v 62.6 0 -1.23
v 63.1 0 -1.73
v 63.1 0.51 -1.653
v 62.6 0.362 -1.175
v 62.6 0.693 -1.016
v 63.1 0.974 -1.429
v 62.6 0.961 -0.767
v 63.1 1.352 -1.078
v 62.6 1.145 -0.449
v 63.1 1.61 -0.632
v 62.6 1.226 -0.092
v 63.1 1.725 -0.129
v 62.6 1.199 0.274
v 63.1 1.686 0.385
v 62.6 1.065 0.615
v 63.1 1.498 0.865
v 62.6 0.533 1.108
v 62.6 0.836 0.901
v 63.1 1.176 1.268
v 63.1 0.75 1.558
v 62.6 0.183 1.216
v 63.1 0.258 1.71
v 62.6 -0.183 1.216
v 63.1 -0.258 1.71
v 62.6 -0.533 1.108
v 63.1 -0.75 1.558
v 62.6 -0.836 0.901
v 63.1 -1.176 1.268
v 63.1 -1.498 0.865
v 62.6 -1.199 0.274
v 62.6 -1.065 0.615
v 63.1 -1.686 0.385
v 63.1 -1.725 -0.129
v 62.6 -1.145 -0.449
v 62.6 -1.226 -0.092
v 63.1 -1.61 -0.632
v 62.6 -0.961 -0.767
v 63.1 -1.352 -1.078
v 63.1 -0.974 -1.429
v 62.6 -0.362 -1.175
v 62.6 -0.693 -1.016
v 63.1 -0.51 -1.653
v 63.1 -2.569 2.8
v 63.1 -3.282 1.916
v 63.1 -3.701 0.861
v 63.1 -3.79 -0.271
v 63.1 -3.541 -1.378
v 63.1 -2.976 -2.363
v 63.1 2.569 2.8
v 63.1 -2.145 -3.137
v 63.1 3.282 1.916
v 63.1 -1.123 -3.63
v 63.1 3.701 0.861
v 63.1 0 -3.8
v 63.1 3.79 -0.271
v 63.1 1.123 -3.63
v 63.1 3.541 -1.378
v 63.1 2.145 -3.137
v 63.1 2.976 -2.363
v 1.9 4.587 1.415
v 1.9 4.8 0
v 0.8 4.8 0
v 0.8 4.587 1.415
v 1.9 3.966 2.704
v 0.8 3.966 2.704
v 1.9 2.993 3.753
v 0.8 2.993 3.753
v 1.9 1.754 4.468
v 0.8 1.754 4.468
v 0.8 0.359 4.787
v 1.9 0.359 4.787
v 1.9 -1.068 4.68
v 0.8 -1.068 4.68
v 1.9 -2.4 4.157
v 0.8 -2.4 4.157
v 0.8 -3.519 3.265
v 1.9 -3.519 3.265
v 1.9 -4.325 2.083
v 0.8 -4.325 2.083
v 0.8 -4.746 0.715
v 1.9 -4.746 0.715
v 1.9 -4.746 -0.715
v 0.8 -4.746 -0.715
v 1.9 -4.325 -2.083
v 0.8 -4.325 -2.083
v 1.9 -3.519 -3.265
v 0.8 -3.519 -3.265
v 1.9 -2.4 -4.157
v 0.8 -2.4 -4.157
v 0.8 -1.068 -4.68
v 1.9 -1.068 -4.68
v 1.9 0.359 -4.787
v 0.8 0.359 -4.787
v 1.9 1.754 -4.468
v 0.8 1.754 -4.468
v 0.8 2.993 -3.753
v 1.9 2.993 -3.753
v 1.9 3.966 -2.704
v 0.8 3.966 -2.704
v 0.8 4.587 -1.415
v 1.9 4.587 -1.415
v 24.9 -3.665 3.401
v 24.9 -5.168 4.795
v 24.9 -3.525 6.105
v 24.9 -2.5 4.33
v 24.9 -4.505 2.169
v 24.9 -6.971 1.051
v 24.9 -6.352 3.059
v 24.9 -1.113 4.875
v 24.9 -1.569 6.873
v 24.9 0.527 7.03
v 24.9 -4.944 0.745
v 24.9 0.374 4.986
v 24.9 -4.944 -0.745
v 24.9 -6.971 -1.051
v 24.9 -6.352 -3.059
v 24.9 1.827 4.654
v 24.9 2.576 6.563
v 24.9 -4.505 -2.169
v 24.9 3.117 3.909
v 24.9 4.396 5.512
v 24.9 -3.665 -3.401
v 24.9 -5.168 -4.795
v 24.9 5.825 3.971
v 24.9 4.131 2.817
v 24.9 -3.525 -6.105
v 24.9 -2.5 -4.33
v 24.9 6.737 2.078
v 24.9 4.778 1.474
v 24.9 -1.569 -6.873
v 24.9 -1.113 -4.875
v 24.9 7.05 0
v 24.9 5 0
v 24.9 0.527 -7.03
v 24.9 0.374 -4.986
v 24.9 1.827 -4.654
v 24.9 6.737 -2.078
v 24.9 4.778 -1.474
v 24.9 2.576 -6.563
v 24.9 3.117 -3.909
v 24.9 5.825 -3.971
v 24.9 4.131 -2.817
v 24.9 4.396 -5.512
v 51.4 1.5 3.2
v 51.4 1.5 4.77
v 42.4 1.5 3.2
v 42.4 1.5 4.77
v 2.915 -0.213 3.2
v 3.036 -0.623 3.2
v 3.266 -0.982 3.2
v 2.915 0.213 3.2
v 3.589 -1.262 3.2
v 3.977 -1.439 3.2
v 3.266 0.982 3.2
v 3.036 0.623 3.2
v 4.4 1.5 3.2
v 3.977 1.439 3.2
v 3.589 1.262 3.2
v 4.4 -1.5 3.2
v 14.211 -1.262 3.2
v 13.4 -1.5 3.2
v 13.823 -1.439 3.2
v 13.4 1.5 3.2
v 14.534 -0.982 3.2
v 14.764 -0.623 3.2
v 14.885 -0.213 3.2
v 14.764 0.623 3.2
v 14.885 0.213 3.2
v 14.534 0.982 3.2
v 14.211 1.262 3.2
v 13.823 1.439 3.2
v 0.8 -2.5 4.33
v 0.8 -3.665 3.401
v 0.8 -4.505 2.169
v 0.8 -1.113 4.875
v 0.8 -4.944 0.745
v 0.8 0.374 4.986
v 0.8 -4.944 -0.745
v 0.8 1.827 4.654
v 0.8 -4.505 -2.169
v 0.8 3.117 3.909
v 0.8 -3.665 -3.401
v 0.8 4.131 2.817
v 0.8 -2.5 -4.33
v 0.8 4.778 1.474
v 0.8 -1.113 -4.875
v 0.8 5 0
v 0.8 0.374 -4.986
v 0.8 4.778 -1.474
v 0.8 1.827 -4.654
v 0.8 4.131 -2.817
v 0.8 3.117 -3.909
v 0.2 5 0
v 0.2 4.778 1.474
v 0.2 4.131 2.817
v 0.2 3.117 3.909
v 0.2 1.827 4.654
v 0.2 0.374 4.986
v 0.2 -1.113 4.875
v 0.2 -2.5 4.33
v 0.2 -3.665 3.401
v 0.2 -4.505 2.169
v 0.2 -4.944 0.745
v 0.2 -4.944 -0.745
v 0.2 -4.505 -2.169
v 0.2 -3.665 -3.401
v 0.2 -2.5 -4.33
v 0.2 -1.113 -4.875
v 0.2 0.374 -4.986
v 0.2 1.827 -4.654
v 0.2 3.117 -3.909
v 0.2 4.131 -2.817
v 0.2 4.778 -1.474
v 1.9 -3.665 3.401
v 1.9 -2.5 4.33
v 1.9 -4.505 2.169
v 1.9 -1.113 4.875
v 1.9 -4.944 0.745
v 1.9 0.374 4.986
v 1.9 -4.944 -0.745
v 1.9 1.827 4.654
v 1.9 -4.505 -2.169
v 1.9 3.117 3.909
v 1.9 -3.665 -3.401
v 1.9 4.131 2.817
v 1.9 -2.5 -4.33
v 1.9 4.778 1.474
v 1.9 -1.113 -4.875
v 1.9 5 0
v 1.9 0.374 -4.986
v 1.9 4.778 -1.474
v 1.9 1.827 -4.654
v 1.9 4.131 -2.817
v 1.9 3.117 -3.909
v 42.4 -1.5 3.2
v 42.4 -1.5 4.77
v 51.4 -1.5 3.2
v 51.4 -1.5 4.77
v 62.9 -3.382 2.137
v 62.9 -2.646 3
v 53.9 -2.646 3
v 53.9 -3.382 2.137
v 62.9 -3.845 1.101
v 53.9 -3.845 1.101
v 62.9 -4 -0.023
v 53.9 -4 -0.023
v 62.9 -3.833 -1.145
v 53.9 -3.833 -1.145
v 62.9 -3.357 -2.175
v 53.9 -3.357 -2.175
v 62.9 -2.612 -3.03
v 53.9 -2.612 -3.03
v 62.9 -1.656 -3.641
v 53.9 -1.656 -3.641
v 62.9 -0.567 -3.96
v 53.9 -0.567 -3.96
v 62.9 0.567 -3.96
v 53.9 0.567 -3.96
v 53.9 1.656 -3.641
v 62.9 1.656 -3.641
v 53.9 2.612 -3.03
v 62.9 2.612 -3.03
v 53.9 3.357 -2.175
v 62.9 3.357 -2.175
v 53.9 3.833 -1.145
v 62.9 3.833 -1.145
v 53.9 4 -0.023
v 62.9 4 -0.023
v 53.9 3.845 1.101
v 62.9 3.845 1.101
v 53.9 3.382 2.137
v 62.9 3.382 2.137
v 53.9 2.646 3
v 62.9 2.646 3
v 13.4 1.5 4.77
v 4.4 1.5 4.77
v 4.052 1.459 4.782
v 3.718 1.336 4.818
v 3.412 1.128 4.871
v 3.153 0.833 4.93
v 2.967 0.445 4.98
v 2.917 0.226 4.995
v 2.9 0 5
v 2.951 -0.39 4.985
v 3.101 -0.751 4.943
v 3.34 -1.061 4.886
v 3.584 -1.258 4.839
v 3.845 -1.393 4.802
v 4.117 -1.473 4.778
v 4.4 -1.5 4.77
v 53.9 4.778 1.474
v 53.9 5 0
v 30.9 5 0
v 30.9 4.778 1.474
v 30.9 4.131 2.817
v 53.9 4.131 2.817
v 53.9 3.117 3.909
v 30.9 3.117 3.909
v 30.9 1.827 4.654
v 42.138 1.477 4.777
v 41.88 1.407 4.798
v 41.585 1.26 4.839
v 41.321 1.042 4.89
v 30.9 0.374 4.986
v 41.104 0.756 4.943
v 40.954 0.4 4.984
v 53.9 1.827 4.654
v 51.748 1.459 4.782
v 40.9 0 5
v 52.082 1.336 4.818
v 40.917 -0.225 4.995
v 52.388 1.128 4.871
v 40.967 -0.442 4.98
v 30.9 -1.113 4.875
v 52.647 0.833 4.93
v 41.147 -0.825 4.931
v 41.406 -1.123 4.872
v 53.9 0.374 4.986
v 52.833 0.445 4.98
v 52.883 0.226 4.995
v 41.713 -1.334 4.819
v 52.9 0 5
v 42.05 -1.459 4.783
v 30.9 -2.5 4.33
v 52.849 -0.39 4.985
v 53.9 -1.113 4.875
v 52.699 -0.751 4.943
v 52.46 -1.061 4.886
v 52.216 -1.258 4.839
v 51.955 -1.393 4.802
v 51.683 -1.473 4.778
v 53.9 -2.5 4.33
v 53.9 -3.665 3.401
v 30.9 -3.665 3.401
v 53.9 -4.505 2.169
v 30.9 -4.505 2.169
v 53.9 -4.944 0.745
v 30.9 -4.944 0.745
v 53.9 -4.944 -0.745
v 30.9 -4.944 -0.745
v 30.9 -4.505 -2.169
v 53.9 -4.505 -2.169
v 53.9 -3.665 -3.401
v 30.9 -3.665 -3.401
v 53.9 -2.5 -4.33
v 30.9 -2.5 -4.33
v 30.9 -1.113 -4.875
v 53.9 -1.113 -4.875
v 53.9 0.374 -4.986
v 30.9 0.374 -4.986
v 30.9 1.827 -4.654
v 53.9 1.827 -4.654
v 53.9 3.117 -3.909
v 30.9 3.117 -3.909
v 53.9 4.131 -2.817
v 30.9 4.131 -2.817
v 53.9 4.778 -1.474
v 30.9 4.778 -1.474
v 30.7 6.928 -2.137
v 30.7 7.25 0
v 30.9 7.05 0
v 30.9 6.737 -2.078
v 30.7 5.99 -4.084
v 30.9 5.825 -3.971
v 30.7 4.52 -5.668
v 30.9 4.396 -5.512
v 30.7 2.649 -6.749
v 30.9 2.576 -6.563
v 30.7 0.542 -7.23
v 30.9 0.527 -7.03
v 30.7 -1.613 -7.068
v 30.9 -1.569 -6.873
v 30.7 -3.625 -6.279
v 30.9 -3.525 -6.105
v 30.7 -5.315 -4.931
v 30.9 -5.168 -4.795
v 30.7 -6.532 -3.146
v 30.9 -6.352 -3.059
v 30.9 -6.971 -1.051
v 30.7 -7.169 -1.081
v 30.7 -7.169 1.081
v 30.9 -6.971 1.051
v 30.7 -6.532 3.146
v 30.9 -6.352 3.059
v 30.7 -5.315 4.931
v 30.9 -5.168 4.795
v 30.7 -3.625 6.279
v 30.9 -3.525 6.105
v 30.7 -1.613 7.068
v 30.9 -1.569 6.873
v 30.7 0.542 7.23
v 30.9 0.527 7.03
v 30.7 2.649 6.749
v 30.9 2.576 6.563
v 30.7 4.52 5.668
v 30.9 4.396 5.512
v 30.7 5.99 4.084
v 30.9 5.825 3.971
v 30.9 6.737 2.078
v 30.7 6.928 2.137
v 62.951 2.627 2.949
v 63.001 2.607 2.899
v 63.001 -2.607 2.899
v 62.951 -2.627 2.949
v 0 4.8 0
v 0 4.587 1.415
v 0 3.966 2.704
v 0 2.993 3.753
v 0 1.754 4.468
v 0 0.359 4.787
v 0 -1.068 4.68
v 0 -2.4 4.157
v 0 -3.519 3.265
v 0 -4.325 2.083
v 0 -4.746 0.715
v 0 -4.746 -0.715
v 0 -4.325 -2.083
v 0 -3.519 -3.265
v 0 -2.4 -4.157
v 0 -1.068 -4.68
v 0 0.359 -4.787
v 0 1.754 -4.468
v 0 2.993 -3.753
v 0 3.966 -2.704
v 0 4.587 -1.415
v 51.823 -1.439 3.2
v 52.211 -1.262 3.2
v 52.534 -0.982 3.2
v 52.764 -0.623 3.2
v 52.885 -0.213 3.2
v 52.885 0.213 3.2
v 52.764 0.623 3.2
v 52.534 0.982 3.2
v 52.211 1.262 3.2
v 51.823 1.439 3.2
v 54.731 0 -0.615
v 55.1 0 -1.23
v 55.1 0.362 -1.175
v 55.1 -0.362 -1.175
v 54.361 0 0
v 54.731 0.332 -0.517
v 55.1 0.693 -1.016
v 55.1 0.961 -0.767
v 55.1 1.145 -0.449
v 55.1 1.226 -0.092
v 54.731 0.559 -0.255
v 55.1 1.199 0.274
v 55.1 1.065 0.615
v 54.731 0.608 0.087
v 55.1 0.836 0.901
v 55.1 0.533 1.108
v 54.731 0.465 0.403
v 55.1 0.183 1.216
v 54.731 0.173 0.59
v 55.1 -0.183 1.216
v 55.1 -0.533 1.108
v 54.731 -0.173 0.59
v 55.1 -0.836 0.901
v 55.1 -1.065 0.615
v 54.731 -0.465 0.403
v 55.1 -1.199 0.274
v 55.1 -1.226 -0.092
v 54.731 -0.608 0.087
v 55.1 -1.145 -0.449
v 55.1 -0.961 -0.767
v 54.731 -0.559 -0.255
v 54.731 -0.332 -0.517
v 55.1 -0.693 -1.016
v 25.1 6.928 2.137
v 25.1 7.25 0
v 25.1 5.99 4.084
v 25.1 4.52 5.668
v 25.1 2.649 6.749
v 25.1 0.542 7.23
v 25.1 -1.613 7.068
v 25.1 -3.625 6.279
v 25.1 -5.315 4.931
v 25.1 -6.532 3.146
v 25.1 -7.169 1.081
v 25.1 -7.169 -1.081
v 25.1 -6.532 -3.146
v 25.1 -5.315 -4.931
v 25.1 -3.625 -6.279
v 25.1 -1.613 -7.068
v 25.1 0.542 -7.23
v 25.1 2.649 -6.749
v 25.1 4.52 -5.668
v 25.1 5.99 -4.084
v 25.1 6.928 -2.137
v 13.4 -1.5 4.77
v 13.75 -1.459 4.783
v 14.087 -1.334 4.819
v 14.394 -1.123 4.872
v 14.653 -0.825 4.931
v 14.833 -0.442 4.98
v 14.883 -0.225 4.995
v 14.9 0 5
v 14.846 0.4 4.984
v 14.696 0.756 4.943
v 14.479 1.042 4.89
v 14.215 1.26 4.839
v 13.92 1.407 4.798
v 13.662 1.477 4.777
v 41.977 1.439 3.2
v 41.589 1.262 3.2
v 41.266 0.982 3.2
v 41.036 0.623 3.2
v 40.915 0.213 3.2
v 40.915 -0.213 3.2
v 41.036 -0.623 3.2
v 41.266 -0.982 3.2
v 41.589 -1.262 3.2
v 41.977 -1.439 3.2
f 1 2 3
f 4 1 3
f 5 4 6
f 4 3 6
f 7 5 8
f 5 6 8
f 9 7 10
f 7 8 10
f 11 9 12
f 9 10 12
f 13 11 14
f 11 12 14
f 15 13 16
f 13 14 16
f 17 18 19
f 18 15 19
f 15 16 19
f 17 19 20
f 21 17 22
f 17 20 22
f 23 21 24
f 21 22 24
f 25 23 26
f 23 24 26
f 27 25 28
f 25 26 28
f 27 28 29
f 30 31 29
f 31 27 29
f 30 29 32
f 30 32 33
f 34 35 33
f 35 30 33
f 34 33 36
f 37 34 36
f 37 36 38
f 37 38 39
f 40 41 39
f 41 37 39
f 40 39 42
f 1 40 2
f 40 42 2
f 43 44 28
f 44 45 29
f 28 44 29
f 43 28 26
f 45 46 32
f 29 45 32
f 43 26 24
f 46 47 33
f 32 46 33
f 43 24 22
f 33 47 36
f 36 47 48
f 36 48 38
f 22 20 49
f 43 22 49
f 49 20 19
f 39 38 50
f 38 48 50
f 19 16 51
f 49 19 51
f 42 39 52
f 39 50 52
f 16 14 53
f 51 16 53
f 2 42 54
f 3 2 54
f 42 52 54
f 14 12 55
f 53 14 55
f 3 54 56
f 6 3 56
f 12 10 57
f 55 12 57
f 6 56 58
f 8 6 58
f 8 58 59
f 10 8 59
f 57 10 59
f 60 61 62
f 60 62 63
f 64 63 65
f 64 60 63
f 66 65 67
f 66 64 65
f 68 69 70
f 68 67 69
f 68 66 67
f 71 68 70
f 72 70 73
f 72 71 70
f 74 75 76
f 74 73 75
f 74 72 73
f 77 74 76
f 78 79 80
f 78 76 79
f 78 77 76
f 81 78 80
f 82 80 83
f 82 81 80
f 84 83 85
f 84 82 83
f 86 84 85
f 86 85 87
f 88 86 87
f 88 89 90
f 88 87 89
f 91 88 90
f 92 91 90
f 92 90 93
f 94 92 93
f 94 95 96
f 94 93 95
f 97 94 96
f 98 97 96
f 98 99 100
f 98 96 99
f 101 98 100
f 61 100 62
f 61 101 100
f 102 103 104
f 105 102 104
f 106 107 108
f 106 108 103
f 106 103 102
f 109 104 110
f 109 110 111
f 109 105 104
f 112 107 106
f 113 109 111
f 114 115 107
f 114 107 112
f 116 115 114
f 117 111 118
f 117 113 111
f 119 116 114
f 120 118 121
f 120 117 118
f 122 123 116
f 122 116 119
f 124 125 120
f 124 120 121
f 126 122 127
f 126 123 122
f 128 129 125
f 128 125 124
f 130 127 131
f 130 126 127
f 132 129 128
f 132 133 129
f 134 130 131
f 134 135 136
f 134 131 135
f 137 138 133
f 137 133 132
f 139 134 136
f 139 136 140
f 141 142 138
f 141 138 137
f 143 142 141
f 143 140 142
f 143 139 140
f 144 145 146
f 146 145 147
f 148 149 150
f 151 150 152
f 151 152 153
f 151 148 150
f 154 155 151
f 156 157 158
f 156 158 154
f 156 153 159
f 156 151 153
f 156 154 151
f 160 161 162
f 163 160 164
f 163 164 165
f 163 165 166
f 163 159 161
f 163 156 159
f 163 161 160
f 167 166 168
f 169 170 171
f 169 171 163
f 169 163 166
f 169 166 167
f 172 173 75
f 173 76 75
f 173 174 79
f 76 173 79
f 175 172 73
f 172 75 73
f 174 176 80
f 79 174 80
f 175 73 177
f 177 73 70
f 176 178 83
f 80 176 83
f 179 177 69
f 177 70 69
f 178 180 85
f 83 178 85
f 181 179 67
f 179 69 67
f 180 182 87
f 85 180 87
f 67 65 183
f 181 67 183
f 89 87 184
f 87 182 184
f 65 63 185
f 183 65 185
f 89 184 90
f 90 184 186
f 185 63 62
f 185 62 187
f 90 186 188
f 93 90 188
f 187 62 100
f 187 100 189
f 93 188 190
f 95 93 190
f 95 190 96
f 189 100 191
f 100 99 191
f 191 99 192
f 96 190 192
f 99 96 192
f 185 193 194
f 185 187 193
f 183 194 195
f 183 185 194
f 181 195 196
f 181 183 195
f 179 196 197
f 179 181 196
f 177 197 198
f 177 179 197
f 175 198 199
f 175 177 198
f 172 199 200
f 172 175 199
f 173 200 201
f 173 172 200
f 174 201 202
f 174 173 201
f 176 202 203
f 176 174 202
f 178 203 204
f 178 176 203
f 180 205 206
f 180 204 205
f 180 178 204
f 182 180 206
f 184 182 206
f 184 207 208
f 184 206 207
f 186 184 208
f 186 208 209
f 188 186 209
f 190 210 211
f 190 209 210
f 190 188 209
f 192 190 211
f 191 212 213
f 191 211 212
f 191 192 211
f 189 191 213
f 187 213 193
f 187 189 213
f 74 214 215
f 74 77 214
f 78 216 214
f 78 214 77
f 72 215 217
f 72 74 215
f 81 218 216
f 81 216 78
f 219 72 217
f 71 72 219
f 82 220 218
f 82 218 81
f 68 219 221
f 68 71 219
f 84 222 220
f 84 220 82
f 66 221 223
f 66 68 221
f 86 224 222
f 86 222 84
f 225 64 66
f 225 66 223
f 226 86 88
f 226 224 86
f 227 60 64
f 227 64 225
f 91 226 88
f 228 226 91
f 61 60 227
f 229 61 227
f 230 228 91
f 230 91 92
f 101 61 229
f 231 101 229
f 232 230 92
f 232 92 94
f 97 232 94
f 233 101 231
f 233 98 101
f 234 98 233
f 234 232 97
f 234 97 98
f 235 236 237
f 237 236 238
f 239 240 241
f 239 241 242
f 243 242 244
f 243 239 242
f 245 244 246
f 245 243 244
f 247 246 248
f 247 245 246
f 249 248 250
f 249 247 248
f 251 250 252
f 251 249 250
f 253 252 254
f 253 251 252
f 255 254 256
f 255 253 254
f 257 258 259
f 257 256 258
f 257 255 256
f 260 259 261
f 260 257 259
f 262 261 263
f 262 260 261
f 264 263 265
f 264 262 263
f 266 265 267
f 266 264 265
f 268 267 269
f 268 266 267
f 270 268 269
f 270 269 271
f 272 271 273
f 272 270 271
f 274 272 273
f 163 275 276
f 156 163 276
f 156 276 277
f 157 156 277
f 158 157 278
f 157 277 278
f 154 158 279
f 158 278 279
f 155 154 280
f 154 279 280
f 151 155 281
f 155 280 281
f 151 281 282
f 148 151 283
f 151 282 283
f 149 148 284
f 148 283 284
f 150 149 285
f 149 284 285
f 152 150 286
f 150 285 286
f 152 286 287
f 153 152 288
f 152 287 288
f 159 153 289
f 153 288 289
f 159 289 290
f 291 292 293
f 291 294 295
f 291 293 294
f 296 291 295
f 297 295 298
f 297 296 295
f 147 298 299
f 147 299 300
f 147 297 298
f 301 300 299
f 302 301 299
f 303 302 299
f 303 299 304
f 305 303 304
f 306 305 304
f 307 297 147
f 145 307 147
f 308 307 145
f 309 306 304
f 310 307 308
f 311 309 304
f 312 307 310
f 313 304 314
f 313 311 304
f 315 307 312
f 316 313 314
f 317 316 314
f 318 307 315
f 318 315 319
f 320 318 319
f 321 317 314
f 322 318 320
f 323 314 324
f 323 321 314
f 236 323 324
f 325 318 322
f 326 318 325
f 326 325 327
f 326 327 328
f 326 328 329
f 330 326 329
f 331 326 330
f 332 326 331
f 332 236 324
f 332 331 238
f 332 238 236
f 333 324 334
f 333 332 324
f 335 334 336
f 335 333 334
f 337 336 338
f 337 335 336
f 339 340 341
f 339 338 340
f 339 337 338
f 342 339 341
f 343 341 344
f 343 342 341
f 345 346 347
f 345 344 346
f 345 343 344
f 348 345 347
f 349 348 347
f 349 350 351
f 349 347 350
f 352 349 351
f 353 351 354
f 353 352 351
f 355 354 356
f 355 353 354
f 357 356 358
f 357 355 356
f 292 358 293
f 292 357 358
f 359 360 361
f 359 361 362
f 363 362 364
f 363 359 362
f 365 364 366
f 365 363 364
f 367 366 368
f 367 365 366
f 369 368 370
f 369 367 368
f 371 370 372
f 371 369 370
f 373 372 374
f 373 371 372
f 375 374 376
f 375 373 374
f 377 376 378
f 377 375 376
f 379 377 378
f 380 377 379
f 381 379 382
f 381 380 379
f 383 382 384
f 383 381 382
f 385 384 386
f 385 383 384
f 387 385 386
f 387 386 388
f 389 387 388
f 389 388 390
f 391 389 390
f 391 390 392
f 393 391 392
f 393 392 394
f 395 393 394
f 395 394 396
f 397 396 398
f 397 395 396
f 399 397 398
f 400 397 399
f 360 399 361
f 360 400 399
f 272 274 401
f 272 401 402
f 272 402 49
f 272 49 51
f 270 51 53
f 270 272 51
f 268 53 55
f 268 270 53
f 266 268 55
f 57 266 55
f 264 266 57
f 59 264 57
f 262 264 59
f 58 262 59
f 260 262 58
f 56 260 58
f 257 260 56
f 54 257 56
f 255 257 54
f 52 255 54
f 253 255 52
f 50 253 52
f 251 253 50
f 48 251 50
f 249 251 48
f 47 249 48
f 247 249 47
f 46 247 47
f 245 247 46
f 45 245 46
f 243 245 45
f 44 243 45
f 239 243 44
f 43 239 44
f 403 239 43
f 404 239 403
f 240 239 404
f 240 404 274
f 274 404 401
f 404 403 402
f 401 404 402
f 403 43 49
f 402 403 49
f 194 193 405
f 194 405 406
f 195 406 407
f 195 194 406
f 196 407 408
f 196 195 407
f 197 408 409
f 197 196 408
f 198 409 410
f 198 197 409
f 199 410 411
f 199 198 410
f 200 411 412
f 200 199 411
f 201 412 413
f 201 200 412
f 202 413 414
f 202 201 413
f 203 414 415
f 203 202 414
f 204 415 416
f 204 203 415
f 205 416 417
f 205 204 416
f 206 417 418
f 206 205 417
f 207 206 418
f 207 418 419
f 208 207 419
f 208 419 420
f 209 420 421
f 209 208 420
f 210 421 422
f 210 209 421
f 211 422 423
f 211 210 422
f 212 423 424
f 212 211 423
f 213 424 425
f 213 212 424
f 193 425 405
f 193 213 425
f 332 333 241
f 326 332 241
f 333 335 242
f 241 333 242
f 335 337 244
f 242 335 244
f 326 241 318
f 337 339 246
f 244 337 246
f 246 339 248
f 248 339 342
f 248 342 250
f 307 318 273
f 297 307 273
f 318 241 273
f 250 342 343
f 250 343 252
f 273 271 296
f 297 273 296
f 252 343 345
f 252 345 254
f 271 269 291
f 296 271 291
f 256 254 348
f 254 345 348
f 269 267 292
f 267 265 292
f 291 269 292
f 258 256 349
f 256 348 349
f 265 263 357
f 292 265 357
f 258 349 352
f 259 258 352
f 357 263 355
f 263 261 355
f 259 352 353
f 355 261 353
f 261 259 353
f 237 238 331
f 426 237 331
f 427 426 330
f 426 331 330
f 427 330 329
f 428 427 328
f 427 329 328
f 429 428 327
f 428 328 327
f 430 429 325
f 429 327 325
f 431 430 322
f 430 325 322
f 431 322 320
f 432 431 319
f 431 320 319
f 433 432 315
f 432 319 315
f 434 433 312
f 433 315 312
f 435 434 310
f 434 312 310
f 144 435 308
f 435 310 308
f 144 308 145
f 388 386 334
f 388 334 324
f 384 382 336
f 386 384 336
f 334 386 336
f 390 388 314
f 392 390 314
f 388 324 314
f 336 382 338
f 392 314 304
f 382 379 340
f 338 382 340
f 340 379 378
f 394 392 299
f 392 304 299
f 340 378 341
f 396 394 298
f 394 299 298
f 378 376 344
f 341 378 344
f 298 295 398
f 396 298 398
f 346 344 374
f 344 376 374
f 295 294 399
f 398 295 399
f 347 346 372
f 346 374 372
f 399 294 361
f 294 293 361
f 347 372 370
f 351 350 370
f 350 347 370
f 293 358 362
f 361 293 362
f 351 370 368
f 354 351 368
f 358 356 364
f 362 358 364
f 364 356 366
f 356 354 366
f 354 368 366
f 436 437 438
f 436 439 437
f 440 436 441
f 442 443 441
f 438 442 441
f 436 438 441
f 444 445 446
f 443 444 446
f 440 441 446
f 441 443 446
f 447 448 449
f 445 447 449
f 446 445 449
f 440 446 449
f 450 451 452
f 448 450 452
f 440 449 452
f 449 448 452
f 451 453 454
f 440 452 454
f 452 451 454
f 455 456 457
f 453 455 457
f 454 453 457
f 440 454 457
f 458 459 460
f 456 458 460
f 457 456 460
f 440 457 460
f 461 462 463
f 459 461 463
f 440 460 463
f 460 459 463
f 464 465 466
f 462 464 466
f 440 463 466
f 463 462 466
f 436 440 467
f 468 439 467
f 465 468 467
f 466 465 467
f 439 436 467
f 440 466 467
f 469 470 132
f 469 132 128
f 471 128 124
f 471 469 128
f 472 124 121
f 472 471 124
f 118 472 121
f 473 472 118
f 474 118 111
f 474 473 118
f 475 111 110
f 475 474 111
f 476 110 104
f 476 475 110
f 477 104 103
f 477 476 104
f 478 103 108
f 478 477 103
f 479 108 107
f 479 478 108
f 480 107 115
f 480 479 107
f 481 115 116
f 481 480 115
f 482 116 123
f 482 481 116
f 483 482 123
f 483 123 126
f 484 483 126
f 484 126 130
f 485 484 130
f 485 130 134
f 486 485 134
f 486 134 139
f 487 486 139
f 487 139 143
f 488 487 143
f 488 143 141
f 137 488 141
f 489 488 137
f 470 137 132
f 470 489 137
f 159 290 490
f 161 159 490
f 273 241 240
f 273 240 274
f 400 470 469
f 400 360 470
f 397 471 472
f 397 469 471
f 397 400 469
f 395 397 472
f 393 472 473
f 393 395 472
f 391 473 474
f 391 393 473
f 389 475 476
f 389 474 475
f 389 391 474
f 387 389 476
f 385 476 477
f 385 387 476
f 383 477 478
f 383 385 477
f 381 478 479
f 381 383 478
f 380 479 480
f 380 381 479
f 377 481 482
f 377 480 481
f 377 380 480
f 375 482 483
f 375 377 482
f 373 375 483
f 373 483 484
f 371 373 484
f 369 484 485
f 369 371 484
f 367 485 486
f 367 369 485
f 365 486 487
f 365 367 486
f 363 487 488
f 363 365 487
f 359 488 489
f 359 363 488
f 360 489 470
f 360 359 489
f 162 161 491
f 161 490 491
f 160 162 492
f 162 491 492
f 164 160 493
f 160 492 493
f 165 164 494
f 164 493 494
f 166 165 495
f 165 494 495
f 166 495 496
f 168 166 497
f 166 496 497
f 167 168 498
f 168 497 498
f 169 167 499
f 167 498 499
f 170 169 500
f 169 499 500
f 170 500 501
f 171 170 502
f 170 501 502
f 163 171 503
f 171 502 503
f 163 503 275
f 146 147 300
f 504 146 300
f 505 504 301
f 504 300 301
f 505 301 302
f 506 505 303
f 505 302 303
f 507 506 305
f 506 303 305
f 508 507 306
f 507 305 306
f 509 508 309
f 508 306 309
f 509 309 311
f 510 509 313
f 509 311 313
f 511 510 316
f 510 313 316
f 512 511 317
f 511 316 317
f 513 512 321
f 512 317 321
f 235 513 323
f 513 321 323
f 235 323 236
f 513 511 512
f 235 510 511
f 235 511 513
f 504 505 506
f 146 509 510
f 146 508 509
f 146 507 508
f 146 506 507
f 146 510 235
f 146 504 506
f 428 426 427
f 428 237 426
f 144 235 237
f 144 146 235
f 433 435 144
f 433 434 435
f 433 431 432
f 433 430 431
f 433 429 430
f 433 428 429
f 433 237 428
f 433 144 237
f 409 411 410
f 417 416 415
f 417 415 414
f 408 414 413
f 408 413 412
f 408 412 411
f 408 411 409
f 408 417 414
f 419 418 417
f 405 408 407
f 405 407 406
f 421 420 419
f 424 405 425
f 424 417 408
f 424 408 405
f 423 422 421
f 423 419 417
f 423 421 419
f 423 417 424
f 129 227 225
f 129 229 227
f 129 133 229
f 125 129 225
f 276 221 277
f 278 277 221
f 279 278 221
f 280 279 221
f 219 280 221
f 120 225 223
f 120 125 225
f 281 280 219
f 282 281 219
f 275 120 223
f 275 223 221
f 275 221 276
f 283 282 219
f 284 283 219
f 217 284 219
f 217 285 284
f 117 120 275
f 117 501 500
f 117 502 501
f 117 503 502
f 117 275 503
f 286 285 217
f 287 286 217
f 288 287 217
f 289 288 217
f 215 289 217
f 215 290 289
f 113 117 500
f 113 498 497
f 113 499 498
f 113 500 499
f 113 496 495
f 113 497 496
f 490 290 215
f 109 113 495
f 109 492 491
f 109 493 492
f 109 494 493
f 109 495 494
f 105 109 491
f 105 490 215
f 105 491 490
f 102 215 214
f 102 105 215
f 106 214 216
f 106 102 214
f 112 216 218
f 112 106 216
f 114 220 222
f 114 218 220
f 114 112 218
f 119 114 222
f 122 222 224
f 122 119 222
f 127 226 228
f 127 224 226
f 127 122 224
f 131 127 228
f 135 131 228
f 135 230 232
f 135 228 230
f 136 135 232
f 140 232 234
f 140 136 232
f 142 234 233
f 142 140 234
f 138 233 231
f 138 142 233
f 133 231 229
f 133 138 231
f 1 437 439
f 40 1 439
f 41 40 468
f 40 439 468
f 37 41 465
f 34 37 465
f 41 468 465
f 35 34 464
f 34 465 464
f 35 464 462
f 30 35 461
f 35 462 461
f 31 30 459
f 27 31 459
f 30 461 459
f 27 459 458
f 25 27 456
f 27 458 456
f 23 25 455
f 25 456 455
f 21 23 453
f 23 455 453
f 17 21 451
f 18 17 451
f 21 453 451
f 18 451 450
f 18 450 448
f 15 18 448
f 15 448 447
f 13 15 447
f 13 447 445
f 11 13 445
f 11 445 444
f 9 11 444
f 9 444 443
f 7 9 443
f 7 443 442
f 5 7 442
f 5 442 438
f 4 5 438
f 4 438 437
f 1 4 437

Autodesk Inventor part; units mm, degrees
ref_plane "YZ Plane" through (0, 0, 0) normal (1, 0, 0) x (0, 1, 0)
ref_plane "XZ Plane" through (0, 0, 0) normal (0, 1, 0) x (-1, 0, 0)
sketch "Skizze1" plane through (0, 0, 0) normal (0, 0, 1) x (1, 0, 0)
  line L0 (0, 0) -> (0, 5)
  line L1 (0, 5) -> (0.8, 5)
  line L2 (0.8, 5) -> (0.8, 4.8)
  line L3 (0.8, 4.8) -> (1.9, 4.8)
  line L4 (1.9, 4.8) -> (1.9, 5)
  line L5 (1.9, 5) -> (24.9, 5)
  line L6 (24.9, 5) -> (24.9, 7.25)
  line L7 (24.9, 7.25) -> (30.9, 7.25)
  line L8 (30.9, 7.25) -> (30.9, 5)
  line L9 (30.9, 5) -> (53.9, 5)
  line L10 (53.9, 5) -> (53.9, 4)
  line L11 (53.9, 4) -> (63.1, 4)
  line L12 (63.1, 4) -> (63.1, 0)
  line L13 (63.1, 0) -> (0, 0)
  line L14 (15.9, 5) -> (15.9, 0) construction
  line L15 (39.9, 5) -> (39.9, 0) construction
  line L16 (9.9, 5) -> (9.9, 0) construction
  line L17 (45.9, 5) -> (45.9, 0) construction
  line L18 (53.9, 5) -> (53.9, 0) construction
  dimension "d0" = 10
  dimension "d2" = 14.5
  dimension "d3" = 1.1
  dimension "d4" = 9.6
  dimension "d5" = 0.8
  dimension "d7" = 9
  dimension "d8" = 9
  dimension "d9" = 6
  dimension "d10" = 14
  dimension "d11" = 14
  dimension "ParrallelMecha_DrivenLink_OuterWidth" = 52
  dimension "d22" = 6
  dimension "d23" = 6
  dimension "Querstrebe_Length" = 36
  dimension "d25" = 9.2
  dimension "d26" = 8
revolve "Umdrehung1" add sketch "Skizze1" angle 360 about axis through (63.1, 0, 0) along (-1, 0, 0)
chamfer "Fase1" distance 0.2 angle 45 4 edges at (24.9, -7.25, 0) (30.9, -7.25, 0) (63.1, -4, 0) (0, -5, 0)
ref_plane "Wellennut_Spiegelebene" through (27.9, 0, 0) normal (-1, 0, 0) x (0, 0, 1)
ref_plane "Arbeitsebene2" through (13.4, 0, 5) normal (0, 0, 1) x (1, 0, 0)
sketch "Skizze3" plane through (13.4, 0, 5) normal (0, 0, 1) x (1, 0, 0)
  line L0 (2.5, 5) -> (2.5, 0) construction
  line L1 (-26.02, 0) -> (62.32, 0) construction
  line L2 (0, 0) -> (-9, 0) construction
  line L3 (0, 1.5) -> (-9, 1.5)
  line L4 (-9, -1.5) -> (0, -1.5)
  arc A0 (0, -1.5) -> (0, 1.5) centre (0, 0) ccw
  arc A1 (-9, 1.5) -> (-9, -1.5) centre (-9, 0) ccw
  line L5 (-11.5, 0) -> (2.5, 0) construction
  line L6 (-11.5, -5) -> (-11.5, 5) construction
  point P0 (-13.4, 0)
  point P1 (-4.5, 0)
  point P2 (-4.5, 0)
  dimension "d17" = 3
  dimension "d18" = 12
extrude "Wellennut" cut sketch "Skizze3" against normal blind 1.8
mirror "Spiegeln1" about plane through (27.9, 0, 0) normal (-1, 0, 0) of "Wellennut"
sketch "Skizze4" plane through (53.9, 0, 0) normal (1, 0, 0) x (0, 0, -1)
  circle A0 centre (0, 0) radius 4 projected
  line L0 (-3, -2.6458) -> (-3, 2.6458)
  point P0 (0, 0)
  dimension "d27" = 3
extrude "Extrusion2" cut sketch "Skizze4" along normal through all contours L0 A0 picked at (-3.1815, -0.6179)
chamfer "Fase2" distance 0.2 angle 45 1 edges at (63.1, 0, 3)
sketch "Skizze5" plane through (63.1, 0, 0) normal (1, 0, 0) x (0, 0, -1)
  arc A0 (-3, -2.6458) -> (-3, 2.6458) centre (0, 0) ccw construction
  circle A1 centre (0, 0) radius 5 construction
  point P0 (0, 0)
hole "Bohrung1" at (63.1, 0, 0) direction (-1, 0, 0) diameter 2.459 depth 8 tip angle 118 thread size "M3x0.5" class "6H" standard "ISO Metric profile"
chamfer "Fase3" distance 0.5 angle 45 1 edges at (63.1, 0, 1.2295)
equation "\"d10\" = ParallelLink_Lever_Thickness + ParallelMecha_Bearing_Step_Thickness"
equation "\"d11\" = d10"
equation "\"d22\" = ParallelMecha_Bearing_Step_Thickness"
equation "\"d23\" = d22"
equation "\"d26\" = CapstonV2_ShaftDia"
equation "\"d27\" = 0.5 * CapstonV2_ShaftDia - Poligonprofil_Ausnehmung"
equation "\"ParallelLink_Lever_Thickness\" = 8"
equation "\"ParallelMecha_Bearing_Step_Thickness\" = 6"
equation "\"CapstonV2_ShaftDia\" = 8"
equation "\"Poligonprofil_Ausnehmung\" = 1"
properties part number "ParallelSystem_ProximalPart_Shaft_Driven_Rillenkugellager" material "Edelstahl"
